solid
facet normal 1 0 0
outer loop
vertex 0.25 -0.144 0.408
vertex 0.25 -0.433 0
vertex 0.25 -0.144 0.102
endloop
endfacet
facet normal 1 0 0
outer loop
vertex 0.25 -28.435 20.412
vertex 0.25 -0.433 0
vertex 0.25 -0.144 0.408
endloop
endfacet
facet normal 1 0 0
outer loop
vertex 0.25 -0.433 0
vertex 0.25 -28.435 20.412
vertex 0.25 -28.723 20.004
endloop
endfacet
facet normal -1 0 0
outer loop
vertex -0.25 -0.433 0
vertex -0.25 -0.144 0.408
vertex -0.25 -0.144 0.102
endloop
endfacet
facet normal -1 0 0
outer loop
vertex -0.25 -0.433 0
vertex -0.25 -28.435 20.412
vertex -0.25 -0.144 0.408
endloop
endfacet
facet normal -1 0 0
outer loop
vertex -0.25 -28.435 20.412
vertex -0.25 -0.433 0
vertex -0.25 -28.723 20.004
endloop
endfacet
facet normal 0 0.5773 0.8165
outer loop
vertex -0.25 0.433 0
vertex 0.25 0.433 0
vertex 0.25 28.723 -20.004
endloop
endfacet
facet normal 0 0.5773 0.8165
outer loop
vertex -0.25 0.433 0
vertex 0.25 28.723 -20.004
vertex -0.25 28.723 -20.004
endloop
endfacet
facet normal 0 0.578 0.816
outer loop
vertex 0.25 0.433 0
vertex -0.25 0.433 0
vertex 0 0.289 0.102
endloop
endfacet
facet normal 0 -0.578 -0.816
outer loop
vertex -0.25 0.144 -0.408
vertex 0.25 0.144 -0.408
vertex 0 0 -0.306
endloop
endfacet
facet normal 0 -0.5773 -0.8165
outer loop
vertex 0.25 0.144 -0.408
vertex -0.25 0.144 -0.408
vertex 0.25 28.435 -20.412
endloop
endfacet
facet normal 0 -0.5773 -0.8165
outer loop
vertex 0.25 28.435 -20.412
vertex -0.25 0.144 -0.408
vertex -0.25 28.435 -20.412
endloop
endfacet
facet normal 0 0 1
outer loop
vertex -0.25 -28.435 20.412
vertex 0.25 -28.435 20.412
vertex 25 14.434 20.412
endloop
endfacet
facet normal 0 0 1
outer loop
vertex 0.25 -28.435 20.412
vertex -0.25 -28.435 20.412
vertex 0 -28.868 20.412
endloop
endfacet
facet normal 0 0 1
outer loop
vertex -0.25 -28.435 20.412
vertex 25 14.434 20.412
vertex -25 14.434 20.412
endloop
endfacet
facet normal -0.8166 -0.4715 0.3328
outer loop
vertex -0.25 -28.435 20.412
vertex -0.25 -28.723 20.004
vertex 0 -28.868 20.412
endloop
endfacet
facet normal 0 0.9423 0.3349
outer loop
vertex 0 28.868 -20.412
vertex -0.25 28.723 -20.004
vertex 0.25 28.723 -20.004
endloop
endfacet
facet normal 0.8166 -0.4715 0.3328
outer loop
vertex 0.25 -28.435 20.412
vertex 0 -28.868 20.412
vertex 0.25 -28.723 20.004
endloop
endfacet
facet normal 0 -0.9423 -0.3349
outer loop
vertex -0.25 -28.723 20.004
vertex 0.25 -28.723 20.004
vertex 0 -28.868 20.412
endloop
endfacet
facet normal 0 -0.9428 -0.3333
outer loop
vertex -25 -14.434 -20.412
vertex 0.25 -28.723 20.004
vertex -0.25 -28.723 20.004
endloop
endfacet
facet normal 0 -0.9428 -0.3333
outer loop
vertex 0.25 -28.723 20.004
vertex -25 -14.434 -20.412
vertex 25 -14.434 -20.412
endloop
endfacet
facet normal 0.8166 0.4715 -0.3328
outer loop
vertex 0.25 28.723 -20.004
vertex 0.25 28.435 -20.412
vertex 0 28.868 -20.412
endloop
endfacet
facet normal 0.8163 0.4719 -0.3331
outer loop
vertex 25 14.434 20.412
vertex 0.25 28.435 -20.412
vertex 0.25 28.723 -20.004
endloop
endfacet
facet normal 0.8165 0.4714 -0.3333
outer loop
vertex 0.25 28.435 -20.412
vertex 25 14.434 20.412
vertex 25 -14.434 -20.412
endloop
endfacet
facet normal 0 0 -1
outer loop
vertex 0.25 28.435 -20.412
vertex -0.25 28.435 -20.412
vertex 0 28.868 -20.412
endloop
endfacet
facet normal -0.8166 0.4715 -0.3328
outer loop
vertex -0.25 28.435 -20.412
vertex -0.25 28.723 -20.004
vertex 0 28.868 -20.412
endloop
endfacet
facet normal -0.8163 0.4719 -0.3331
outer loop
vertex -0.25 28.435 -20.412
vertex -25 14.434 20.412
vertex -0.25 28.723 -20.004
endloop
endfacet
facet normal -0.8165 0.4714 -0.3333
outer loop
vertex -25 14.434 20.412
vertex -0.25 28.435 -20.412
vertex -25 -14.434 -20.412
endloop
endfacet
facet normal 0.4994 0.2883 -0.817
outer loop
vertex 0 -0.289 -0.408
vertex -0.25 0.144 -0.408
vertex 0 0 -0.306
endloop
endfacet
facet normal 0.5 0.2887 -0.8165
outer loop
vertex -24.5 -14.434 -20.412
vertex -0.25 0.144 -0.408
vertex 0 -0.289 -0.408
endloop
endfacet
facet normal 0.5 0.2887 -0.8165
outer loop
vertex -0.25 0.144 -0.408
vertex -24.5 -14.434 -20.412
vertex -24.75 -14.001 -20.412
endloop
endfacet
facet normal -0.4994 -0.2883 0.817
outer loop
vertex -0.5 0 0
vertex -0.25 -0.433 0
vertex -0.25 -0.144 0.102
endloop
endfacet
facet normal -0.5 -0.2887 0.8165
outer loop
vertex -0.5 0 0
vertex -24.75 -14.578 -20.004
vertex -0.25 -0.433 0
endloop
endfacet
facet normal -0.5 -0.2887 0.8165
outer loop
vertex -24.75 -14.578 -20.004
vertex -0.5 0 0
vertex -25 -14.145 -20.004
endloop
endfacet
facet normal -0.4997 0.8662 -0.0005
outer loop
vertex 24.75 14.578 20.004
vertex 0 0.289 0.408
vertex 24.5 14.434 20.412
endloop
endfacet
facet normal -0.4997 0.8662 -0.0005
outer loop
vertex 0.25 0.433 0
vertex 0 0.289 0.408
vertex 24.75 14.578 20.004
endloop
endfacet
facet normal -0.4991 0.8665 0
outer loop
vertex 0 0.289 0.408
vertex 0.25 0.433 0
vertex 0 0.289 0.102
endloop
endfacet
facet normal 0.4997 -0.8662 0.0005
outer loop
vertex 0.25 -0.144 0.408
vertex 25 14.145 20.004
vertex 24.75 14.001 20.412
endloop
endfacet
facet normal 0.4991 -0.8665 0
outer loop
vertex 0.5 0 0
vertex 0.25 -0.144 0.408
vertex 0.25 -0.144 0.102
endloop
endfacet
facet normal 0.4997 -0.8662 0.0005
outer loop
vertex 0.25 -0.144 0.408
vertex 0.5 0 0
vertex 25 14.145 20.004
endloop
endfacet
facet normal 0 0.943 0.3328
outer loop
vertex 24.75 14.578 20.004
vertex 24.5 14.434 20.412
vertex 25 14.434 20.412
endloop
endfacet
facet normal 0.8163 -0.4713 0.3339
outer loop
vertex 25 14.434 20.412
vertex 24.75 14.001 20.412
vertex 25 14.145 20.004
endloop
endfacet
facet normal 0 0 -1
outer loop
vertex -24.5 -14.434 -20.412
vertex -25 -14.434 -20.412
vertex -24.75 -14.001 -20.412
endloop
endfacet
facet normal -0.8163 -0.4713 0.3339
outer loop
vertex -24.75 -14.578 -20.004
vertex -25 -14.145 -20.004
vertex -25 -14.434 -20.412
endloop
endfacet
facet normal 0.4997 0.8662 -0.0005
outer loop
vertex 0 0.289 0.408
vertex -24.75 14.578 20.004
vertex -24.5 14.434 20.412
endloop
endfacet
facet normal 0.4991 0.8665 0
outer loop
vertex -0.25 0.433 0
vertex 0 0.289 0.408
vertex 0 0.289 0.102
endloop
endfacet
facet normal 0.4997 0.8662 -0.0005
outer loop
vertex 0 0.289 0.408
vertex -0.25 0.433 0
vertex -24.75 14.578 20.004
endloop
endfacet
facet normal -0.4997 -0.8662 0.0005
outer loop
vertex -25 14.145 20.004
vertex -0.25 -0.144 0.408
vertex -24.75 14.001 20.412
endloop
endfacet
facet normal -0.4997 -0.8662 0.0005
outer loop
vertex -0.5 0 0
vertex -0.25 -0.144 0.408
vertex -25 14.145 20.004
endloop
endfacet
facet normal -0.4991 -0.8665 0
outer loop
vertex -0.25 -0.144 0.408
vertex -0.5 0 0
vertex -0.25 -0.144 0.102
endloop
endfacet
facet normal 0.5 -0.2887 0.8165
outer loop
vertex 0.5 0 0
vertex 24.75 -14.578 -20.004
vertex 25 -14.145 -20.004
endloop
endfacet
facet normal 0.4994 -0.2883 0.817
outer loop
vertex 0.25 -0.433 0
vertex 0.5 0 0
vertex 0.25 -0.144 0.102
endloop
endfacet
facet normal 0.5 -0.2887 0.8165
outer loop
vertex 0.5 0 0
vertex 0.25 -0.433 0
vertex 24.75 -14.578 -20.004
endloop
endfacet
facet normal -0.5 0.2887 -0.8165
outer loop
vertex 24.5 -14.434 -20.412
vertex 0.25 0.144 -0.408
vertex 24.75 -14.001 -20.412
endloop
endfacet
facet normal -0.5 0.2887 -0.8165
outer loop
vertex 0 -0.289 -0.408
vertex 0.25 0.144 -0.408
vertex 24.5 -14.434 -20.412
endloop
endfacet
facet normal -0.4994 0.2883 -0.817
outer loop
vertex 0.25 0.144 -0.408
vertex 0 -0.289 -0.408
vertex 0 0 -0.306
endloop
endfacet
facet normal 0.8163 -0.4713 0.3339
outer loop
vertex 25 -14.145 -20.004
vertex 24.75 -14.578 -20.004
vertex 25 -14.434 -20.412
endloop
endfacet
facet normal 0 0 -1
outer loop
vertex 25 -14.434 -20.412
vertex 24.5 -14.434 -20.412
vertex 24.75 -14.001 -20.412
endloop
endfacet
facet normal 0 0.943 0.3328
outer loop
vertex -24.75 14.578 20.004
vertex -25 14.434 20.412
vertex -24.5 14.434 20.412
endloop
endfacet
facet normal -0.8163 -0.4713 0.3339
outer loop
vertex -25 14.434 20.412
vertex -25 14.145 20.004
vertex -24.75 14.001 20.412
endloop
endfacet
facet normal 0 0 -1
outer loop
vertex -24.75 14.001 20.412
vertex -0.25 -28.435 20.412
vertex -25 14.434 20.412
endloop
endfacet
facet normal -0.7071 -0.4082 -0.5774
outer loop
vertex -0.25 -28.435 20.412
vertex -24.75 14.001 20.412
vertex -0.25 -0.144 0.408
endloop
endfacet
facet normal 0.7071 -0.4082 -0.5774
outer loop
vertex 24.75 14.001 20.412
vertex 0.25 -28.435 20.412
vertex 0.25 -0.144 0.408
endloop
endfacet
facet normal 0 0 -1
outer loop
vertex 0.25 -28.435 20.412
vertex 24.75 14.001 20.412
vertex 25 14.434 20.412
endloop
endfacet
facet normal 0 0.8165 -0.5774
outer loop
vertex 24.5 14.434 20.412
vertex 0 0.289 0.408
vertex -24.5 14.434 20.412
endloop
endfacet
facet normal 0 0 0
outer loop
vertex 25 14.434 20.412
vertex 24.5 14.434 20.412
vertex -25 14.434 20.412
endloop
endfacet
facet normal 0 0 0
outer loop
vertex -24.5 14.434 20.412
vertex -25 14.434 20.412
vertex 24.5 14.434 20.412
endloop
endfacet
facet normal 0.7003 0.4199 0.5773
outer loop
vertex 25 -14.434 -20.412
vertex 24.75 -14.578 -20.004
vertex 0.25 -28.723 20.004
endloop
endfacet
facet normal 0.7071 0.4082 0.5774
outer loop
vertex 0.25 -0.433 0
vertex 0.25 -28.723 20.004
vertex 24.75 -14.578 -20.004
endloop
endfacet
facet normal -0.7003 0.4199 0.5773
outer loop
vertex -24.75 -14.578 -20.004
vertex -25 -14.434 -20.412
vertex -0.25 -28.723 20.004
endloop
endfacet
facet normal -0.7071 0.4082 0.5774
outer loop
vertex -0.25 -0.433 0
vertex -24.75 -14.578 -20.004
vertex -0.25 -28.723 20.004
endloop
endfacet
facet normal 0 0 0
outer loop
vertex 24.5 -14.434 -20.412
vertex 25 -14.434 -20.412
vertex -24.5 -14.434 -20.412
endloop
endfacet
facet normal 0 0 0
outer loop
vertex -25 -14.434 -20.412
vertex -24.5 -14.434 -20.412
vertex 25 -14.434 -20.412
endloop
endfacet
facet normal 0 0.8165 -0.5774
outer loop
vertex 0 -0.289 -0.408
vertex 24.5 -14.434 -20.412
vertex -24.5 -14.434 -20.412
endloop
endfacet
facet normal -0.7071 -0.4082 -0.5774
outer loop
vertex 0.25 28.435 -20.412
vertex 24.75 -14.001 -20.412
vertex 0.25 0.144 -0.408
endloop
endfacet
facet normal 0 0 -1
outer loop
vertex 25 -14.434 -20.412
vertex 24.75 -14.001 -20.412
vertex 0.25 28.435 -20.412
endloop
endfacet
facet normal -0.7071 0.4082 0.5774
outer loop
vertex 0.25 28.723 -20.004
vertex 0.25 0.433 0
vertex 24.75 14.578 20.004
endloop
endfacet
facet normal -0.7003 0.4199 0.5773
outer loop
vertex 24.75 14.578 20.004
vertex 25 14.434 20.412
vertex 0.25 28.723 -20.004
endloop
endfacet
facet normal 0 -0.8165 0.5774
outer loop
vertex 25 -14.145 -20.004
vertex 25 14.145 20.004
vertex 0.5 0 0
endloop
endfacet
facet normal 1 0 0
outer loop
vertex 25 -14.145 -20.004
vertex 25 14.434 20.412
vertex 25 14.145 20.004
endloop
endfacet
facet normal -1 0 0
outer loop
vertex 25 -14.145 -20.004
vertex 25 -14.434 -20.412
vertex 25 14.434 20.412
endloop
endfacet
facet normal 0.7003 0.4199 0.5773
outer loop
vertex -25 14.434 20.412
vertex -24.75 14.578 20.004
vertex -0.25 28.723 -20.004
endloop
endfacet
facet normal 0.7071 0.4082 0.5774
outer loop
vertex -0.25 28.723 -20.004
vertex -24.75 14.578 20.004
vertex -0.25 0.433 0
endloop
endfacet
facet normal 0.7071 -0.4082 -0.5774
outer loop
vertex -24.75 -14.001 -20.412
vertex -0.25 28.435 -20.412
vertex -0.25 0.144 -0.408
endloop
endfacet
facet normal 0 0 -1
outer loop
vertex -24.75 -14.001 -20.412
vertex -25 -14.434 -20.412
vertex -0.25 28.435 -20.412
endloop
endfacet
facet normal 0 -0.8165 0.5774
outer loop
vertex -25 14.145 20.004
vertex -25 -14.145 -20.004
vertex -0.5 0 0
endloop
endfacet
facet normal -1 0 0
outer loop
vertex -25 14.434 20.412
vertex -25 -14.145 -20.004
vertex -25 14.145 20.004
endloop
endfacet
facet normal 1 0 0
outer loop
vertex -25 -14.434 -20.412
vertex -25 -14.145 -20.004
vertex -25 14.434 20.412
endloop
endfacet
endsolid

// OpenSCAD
// Approximation of a tetrahemihexahedron
//
// Bill Owens   March 12, 2014
//
// This is only an approximation of the polyhedron since the true shape 
// isn't manifold and can't be rendered correctly. 
// The right-triangle faces are actually quarters of square faces that 
// intersect with each other, so in order to make the model manifold I 
// built it out of four tetrahedra and added small fillets along each 
// intersection line.

// for Thingiverse Customizer

/* Global */

// Length of one edge of the object (mm)
size = 50;

// Printing orientation
orientation = "hollow"; // [solid:On a solid triangle,hollow:On a hollow triangle]


module onetetra() {
polyhedron(
	points = [
		[0.5,0.5,0],			// 0
		[-0.5,0.5,0],		// 1
		[0,0,1/sqrt(2)],		// 2 (top vertex)
		[0,0,0],				// 3 (center)
    ],
    triangles = [
		[0,2,1],
		[0,1,3],
		[0,3,2],
		[1,2,3],
	]);
}

module octahedron() {
polyhedron(
	points = [
		[0.5,0.5,0],			// 0
		[-0.5,0.5,0],		// 1
		[0,0,1/sqrt(2)],		// 2 (top vertex)
		[-0.5,-0.5,0],		// 3
		[0.5,-0.5,0],			// 4
		[0,0,-1/sqrt(2)]		// 5 (bottom vertex)
    ],
    triangles = [
		[0,2,1],
		[1,2,3],
		[3,2,4],
		[4,2,0],
		[0,1,5],
		[1,3,5],
		[3,4,5],
		[4,0,5]
	]);
}

module fillet() {
intersection() {
	cube([0.01,0.01,sqrt(2)], center=true);
	octahedron();
}
}

module tetrahemihexahedron() {
union() {
	onetetra();
	rotate(180,[0,0,1]) onetetra();
	rotate(180,[1,1,0]) onetetra();
	rotate(180,[-1,1,0]) onetetra();
	fillet();
	rotate(90,[-1,1,0]) fillet();
	rotate(90,[1,1,0]) fillet();
} 
}

// Decide whether the model should sit on a solid or hollow side
if (orientation == "solid") {
	scale(size) rotate(90-atan(1/sqrt(2)),[0,1,0]) tetrahemihexahedron();
} else {
	scale(size) rotate(90-atan(1/sqrt(2)),[1,0,0]) tetrahemihexahedron();
} 
